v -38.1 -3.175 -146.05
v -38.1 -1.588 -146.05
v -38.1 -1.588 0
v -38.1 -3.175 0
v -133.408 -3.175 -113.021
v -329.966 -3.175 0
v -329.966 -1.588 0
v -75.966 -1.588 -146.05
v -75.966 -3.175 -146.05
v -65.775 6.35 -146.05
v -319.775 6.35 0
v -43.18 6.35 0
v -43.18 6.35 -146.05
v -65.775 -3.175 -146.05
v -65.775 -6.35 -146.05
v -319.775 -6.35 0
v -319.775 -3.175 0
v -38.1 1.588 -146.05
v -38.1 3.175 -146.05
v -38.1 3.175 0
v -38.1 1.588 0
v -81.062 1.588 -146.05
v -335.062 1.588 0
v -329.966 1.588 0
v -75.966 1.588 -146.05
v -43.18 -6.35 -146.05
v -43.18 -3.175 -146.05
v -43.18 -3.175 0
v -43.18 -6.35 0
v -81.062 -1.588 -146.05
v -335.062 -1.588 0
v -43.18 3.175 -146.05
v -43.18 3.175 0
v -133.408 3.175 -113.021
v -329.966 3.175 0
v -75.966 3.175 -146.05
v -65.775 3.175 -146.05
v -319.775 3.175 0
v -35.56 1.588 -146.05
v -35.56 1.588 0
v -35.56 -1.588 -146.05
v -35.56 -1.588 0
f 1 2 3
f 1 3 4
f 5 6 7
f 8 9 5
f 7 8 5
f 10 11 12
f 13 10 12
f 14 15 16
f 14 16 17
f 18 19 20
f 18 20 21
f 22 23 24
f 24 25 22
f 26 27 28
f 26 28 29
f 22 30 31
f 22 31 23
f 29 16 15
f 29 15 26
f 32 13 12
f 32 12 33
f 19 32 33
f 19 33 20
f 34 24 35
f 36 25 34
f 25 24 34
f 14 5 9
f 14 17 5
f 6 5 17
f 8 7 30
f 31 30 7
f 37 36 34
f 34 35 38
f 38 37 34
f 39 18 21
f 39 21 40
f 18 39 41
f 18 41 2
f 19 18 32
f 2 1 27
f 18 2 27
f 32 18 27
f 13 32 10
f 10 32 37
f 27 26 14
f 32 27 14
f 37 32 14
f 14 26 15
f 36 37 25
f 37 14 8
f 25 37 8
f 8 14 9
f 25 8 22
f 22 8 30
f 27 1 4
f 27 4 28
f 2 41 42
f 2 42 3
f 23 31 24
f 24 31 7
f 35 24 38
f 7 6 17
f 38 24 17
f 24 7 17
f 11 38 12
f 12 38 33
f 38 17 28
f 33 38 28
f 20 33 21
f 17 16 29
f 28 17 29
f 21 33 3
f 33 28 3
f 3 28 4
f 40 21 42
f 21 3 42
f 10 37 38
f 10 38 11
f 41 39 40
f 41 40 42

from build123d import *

# Parameters (mm, degrees)
BOSS_EXTRUDE1_DEPTH      = 6.35
BOSS_EXTRUDE1_DEPTH_BACK = 6.35
SKETCH2_W                = 292.995908675
SKETCH2_H                = 3.175
CUT_EXTRUDE1_DEPTH       = 38.1
SKETCH3_W                = 146.05
SKETCH3_H                = 3.175
CUT_EXTRUDE2_DEPTH       = 38.1
CUT_EXTRUDE3_DEPTH       = 3.175
CUT_EXTRUDE4_DEPTH       = 3.175
SKETCH6_W                = 5.08
SKETCH6_H                = 3.175
CUT_EXTRUDE5_DEPTH       = 157.099
CUT_EXTRUDE6_DEPTH       = 339.217
CUT_EXTRUDE6_DEPTH_BACK  = 157.099


with BuildPart() as part:
    # Sketch1 → Boss-Extrude1 (new, two sides: drawn at the far end of the back side and taken through both)
    with BuildSketch(Plane(origin=(0, 0, 0), x_dir=(1, 0, 0), z_dir=(0, 1, 0)).offset(-BOSS_EXTRUDE1_DEPTH_BACK)):
        Polygon((-406.4, 0), (0, 0), (0, 146.05), (-152.4, 146.05), align=None)
    extrude(amount=BOSS_EXTRUDE1_DEPTH + BOSS_EXTRUDE1_DEPTH_BACK)

    # Sketch2 → Cut-Extrude1 (cut)
    with BuildSketch(Plane(origin=(-100.979614843, 0, -175.616721465), x_dir=(-0.8669063030575352, 0, 0.49847112425808277), z_dir=(-0.4984711242580827, 0, -0.8669063030575351))):
        with Locations((205.812767226, 4.7625)):
            Rectangle(SKETCH2_W, SKETCH2_H)
        with Locations((205.812767226, -4.7625)):
            Rectangle(SKETCH2_W, SKETCH2_H)
    extrude(amount=-CUT_EXTRUDE1_DEPTH, mode=Mode.SUBTRACT)

    # Sketch3 → Cut-Extrude2 (cut)
    with BuildSketch(Plane(origin=(0, 0, 0), x_dir=(0, 0, -1), z_dir=(1, 0, 0))):
        with Locations((73.025, 4.7625)):
            Rectangle(SKETCH3_W, SKETCH3_H)
        with Locations((73.025, -4.7625)):
            Rectangle(SKETCH3_W, SKETCH3_H)
    extrude(amount=-CUT_EXTRUDE2_DEPTH, mode=Mode.SUBTRACT)

    # Sketch4 → Cut-Extrude3 (cut)
    with BuildSketch(Plane(origin=(0, 6.35, 0), x_dir=(1, 0, 0), z_dir=(0, 1, 0))):
        Polygon((-133.408250166, 113.020869854), (-75.966284694, 146.05), (-152.4, 146.05), align=None)
    extrude(amount=-CUT_EXTRUDE3_DEPTH, mode=Mode.SUBTRACT)

    # Sketch5 → Cut-Extrude4 (cut)
    with BuildSketch(Plane.XZ.offset(6.35)):
        Polygon((-133.408250166, -113.020869854), (-75.966284694, -146.05), (-152.4, -146.05), align=None)
    extrude(amount=-CUT_EXTRUDE4_DEPTH, mode=Mode.SUBTRACT)

    # Sketch6 → Cut-Extrude5 (cut)
    with BuildSketch(Plane(origin=(0, 0, -146.05), x_dir=(-1, 0, 0), z_dir=(0, 0, -1))):
        Polygon((0, -3.175), (38.1, -3.175), (38.1, -1.5875), (35.56, -1.5875), (35.56, 1.5875), (38.1, 1.5875), (38.1, 3.175), (0, 3.175), align=None)
        with Locations((40.64, -4.7625)):
            Rectangle(SKETCH6_W, SKETCH6_H)
        with Locations((40.64, 4.7625)):
            Rectangle(SKETCH6_W, SKETCH6_H)
    extrude(amount=-CUT_EXTRUDE5_DEPTH, mode=Mode.SUBTRACT)

    # Sketch8 → Cut-Extrude6 (cut, two sides: drawn at the far end of the back side and taken through both)
    with BuildSketch(Plane(origin=(-51.420385157, 0, 29.566721465), x_dir=(0.49847112425808243, 0, 0.8669063030575355), z_dir=(-0.8669063030575355, 0, 0.49847112425808243)).offset(-CUT_EXTRUDE6_DEPTH_BACK)):
        Polygon((-164.478664898, 1.5875), (-164.478664898, 3.175), (-159.398664898, 3.175), (-159.398664898, 6.35), (-164.478664898, 6.35), (-202.578664898, 6.35), (-202.578664898, -6.35), (-164.478664898, -6.35), (-159.398664898, -6.35), (-159.398664898, -3.175), (-164.478664898, -3.175), (-164.478664898, -1.5875), (-167.018664898, -1.5875), (-167.018664898, 1.5875), align=None)
    extrude(amount=CUT_EXTRUDE6_DEPTH + CUT_EXTRUDE6_DEPTH_BACK, mode=Mode.SUBTRACT)


solid = part.part
